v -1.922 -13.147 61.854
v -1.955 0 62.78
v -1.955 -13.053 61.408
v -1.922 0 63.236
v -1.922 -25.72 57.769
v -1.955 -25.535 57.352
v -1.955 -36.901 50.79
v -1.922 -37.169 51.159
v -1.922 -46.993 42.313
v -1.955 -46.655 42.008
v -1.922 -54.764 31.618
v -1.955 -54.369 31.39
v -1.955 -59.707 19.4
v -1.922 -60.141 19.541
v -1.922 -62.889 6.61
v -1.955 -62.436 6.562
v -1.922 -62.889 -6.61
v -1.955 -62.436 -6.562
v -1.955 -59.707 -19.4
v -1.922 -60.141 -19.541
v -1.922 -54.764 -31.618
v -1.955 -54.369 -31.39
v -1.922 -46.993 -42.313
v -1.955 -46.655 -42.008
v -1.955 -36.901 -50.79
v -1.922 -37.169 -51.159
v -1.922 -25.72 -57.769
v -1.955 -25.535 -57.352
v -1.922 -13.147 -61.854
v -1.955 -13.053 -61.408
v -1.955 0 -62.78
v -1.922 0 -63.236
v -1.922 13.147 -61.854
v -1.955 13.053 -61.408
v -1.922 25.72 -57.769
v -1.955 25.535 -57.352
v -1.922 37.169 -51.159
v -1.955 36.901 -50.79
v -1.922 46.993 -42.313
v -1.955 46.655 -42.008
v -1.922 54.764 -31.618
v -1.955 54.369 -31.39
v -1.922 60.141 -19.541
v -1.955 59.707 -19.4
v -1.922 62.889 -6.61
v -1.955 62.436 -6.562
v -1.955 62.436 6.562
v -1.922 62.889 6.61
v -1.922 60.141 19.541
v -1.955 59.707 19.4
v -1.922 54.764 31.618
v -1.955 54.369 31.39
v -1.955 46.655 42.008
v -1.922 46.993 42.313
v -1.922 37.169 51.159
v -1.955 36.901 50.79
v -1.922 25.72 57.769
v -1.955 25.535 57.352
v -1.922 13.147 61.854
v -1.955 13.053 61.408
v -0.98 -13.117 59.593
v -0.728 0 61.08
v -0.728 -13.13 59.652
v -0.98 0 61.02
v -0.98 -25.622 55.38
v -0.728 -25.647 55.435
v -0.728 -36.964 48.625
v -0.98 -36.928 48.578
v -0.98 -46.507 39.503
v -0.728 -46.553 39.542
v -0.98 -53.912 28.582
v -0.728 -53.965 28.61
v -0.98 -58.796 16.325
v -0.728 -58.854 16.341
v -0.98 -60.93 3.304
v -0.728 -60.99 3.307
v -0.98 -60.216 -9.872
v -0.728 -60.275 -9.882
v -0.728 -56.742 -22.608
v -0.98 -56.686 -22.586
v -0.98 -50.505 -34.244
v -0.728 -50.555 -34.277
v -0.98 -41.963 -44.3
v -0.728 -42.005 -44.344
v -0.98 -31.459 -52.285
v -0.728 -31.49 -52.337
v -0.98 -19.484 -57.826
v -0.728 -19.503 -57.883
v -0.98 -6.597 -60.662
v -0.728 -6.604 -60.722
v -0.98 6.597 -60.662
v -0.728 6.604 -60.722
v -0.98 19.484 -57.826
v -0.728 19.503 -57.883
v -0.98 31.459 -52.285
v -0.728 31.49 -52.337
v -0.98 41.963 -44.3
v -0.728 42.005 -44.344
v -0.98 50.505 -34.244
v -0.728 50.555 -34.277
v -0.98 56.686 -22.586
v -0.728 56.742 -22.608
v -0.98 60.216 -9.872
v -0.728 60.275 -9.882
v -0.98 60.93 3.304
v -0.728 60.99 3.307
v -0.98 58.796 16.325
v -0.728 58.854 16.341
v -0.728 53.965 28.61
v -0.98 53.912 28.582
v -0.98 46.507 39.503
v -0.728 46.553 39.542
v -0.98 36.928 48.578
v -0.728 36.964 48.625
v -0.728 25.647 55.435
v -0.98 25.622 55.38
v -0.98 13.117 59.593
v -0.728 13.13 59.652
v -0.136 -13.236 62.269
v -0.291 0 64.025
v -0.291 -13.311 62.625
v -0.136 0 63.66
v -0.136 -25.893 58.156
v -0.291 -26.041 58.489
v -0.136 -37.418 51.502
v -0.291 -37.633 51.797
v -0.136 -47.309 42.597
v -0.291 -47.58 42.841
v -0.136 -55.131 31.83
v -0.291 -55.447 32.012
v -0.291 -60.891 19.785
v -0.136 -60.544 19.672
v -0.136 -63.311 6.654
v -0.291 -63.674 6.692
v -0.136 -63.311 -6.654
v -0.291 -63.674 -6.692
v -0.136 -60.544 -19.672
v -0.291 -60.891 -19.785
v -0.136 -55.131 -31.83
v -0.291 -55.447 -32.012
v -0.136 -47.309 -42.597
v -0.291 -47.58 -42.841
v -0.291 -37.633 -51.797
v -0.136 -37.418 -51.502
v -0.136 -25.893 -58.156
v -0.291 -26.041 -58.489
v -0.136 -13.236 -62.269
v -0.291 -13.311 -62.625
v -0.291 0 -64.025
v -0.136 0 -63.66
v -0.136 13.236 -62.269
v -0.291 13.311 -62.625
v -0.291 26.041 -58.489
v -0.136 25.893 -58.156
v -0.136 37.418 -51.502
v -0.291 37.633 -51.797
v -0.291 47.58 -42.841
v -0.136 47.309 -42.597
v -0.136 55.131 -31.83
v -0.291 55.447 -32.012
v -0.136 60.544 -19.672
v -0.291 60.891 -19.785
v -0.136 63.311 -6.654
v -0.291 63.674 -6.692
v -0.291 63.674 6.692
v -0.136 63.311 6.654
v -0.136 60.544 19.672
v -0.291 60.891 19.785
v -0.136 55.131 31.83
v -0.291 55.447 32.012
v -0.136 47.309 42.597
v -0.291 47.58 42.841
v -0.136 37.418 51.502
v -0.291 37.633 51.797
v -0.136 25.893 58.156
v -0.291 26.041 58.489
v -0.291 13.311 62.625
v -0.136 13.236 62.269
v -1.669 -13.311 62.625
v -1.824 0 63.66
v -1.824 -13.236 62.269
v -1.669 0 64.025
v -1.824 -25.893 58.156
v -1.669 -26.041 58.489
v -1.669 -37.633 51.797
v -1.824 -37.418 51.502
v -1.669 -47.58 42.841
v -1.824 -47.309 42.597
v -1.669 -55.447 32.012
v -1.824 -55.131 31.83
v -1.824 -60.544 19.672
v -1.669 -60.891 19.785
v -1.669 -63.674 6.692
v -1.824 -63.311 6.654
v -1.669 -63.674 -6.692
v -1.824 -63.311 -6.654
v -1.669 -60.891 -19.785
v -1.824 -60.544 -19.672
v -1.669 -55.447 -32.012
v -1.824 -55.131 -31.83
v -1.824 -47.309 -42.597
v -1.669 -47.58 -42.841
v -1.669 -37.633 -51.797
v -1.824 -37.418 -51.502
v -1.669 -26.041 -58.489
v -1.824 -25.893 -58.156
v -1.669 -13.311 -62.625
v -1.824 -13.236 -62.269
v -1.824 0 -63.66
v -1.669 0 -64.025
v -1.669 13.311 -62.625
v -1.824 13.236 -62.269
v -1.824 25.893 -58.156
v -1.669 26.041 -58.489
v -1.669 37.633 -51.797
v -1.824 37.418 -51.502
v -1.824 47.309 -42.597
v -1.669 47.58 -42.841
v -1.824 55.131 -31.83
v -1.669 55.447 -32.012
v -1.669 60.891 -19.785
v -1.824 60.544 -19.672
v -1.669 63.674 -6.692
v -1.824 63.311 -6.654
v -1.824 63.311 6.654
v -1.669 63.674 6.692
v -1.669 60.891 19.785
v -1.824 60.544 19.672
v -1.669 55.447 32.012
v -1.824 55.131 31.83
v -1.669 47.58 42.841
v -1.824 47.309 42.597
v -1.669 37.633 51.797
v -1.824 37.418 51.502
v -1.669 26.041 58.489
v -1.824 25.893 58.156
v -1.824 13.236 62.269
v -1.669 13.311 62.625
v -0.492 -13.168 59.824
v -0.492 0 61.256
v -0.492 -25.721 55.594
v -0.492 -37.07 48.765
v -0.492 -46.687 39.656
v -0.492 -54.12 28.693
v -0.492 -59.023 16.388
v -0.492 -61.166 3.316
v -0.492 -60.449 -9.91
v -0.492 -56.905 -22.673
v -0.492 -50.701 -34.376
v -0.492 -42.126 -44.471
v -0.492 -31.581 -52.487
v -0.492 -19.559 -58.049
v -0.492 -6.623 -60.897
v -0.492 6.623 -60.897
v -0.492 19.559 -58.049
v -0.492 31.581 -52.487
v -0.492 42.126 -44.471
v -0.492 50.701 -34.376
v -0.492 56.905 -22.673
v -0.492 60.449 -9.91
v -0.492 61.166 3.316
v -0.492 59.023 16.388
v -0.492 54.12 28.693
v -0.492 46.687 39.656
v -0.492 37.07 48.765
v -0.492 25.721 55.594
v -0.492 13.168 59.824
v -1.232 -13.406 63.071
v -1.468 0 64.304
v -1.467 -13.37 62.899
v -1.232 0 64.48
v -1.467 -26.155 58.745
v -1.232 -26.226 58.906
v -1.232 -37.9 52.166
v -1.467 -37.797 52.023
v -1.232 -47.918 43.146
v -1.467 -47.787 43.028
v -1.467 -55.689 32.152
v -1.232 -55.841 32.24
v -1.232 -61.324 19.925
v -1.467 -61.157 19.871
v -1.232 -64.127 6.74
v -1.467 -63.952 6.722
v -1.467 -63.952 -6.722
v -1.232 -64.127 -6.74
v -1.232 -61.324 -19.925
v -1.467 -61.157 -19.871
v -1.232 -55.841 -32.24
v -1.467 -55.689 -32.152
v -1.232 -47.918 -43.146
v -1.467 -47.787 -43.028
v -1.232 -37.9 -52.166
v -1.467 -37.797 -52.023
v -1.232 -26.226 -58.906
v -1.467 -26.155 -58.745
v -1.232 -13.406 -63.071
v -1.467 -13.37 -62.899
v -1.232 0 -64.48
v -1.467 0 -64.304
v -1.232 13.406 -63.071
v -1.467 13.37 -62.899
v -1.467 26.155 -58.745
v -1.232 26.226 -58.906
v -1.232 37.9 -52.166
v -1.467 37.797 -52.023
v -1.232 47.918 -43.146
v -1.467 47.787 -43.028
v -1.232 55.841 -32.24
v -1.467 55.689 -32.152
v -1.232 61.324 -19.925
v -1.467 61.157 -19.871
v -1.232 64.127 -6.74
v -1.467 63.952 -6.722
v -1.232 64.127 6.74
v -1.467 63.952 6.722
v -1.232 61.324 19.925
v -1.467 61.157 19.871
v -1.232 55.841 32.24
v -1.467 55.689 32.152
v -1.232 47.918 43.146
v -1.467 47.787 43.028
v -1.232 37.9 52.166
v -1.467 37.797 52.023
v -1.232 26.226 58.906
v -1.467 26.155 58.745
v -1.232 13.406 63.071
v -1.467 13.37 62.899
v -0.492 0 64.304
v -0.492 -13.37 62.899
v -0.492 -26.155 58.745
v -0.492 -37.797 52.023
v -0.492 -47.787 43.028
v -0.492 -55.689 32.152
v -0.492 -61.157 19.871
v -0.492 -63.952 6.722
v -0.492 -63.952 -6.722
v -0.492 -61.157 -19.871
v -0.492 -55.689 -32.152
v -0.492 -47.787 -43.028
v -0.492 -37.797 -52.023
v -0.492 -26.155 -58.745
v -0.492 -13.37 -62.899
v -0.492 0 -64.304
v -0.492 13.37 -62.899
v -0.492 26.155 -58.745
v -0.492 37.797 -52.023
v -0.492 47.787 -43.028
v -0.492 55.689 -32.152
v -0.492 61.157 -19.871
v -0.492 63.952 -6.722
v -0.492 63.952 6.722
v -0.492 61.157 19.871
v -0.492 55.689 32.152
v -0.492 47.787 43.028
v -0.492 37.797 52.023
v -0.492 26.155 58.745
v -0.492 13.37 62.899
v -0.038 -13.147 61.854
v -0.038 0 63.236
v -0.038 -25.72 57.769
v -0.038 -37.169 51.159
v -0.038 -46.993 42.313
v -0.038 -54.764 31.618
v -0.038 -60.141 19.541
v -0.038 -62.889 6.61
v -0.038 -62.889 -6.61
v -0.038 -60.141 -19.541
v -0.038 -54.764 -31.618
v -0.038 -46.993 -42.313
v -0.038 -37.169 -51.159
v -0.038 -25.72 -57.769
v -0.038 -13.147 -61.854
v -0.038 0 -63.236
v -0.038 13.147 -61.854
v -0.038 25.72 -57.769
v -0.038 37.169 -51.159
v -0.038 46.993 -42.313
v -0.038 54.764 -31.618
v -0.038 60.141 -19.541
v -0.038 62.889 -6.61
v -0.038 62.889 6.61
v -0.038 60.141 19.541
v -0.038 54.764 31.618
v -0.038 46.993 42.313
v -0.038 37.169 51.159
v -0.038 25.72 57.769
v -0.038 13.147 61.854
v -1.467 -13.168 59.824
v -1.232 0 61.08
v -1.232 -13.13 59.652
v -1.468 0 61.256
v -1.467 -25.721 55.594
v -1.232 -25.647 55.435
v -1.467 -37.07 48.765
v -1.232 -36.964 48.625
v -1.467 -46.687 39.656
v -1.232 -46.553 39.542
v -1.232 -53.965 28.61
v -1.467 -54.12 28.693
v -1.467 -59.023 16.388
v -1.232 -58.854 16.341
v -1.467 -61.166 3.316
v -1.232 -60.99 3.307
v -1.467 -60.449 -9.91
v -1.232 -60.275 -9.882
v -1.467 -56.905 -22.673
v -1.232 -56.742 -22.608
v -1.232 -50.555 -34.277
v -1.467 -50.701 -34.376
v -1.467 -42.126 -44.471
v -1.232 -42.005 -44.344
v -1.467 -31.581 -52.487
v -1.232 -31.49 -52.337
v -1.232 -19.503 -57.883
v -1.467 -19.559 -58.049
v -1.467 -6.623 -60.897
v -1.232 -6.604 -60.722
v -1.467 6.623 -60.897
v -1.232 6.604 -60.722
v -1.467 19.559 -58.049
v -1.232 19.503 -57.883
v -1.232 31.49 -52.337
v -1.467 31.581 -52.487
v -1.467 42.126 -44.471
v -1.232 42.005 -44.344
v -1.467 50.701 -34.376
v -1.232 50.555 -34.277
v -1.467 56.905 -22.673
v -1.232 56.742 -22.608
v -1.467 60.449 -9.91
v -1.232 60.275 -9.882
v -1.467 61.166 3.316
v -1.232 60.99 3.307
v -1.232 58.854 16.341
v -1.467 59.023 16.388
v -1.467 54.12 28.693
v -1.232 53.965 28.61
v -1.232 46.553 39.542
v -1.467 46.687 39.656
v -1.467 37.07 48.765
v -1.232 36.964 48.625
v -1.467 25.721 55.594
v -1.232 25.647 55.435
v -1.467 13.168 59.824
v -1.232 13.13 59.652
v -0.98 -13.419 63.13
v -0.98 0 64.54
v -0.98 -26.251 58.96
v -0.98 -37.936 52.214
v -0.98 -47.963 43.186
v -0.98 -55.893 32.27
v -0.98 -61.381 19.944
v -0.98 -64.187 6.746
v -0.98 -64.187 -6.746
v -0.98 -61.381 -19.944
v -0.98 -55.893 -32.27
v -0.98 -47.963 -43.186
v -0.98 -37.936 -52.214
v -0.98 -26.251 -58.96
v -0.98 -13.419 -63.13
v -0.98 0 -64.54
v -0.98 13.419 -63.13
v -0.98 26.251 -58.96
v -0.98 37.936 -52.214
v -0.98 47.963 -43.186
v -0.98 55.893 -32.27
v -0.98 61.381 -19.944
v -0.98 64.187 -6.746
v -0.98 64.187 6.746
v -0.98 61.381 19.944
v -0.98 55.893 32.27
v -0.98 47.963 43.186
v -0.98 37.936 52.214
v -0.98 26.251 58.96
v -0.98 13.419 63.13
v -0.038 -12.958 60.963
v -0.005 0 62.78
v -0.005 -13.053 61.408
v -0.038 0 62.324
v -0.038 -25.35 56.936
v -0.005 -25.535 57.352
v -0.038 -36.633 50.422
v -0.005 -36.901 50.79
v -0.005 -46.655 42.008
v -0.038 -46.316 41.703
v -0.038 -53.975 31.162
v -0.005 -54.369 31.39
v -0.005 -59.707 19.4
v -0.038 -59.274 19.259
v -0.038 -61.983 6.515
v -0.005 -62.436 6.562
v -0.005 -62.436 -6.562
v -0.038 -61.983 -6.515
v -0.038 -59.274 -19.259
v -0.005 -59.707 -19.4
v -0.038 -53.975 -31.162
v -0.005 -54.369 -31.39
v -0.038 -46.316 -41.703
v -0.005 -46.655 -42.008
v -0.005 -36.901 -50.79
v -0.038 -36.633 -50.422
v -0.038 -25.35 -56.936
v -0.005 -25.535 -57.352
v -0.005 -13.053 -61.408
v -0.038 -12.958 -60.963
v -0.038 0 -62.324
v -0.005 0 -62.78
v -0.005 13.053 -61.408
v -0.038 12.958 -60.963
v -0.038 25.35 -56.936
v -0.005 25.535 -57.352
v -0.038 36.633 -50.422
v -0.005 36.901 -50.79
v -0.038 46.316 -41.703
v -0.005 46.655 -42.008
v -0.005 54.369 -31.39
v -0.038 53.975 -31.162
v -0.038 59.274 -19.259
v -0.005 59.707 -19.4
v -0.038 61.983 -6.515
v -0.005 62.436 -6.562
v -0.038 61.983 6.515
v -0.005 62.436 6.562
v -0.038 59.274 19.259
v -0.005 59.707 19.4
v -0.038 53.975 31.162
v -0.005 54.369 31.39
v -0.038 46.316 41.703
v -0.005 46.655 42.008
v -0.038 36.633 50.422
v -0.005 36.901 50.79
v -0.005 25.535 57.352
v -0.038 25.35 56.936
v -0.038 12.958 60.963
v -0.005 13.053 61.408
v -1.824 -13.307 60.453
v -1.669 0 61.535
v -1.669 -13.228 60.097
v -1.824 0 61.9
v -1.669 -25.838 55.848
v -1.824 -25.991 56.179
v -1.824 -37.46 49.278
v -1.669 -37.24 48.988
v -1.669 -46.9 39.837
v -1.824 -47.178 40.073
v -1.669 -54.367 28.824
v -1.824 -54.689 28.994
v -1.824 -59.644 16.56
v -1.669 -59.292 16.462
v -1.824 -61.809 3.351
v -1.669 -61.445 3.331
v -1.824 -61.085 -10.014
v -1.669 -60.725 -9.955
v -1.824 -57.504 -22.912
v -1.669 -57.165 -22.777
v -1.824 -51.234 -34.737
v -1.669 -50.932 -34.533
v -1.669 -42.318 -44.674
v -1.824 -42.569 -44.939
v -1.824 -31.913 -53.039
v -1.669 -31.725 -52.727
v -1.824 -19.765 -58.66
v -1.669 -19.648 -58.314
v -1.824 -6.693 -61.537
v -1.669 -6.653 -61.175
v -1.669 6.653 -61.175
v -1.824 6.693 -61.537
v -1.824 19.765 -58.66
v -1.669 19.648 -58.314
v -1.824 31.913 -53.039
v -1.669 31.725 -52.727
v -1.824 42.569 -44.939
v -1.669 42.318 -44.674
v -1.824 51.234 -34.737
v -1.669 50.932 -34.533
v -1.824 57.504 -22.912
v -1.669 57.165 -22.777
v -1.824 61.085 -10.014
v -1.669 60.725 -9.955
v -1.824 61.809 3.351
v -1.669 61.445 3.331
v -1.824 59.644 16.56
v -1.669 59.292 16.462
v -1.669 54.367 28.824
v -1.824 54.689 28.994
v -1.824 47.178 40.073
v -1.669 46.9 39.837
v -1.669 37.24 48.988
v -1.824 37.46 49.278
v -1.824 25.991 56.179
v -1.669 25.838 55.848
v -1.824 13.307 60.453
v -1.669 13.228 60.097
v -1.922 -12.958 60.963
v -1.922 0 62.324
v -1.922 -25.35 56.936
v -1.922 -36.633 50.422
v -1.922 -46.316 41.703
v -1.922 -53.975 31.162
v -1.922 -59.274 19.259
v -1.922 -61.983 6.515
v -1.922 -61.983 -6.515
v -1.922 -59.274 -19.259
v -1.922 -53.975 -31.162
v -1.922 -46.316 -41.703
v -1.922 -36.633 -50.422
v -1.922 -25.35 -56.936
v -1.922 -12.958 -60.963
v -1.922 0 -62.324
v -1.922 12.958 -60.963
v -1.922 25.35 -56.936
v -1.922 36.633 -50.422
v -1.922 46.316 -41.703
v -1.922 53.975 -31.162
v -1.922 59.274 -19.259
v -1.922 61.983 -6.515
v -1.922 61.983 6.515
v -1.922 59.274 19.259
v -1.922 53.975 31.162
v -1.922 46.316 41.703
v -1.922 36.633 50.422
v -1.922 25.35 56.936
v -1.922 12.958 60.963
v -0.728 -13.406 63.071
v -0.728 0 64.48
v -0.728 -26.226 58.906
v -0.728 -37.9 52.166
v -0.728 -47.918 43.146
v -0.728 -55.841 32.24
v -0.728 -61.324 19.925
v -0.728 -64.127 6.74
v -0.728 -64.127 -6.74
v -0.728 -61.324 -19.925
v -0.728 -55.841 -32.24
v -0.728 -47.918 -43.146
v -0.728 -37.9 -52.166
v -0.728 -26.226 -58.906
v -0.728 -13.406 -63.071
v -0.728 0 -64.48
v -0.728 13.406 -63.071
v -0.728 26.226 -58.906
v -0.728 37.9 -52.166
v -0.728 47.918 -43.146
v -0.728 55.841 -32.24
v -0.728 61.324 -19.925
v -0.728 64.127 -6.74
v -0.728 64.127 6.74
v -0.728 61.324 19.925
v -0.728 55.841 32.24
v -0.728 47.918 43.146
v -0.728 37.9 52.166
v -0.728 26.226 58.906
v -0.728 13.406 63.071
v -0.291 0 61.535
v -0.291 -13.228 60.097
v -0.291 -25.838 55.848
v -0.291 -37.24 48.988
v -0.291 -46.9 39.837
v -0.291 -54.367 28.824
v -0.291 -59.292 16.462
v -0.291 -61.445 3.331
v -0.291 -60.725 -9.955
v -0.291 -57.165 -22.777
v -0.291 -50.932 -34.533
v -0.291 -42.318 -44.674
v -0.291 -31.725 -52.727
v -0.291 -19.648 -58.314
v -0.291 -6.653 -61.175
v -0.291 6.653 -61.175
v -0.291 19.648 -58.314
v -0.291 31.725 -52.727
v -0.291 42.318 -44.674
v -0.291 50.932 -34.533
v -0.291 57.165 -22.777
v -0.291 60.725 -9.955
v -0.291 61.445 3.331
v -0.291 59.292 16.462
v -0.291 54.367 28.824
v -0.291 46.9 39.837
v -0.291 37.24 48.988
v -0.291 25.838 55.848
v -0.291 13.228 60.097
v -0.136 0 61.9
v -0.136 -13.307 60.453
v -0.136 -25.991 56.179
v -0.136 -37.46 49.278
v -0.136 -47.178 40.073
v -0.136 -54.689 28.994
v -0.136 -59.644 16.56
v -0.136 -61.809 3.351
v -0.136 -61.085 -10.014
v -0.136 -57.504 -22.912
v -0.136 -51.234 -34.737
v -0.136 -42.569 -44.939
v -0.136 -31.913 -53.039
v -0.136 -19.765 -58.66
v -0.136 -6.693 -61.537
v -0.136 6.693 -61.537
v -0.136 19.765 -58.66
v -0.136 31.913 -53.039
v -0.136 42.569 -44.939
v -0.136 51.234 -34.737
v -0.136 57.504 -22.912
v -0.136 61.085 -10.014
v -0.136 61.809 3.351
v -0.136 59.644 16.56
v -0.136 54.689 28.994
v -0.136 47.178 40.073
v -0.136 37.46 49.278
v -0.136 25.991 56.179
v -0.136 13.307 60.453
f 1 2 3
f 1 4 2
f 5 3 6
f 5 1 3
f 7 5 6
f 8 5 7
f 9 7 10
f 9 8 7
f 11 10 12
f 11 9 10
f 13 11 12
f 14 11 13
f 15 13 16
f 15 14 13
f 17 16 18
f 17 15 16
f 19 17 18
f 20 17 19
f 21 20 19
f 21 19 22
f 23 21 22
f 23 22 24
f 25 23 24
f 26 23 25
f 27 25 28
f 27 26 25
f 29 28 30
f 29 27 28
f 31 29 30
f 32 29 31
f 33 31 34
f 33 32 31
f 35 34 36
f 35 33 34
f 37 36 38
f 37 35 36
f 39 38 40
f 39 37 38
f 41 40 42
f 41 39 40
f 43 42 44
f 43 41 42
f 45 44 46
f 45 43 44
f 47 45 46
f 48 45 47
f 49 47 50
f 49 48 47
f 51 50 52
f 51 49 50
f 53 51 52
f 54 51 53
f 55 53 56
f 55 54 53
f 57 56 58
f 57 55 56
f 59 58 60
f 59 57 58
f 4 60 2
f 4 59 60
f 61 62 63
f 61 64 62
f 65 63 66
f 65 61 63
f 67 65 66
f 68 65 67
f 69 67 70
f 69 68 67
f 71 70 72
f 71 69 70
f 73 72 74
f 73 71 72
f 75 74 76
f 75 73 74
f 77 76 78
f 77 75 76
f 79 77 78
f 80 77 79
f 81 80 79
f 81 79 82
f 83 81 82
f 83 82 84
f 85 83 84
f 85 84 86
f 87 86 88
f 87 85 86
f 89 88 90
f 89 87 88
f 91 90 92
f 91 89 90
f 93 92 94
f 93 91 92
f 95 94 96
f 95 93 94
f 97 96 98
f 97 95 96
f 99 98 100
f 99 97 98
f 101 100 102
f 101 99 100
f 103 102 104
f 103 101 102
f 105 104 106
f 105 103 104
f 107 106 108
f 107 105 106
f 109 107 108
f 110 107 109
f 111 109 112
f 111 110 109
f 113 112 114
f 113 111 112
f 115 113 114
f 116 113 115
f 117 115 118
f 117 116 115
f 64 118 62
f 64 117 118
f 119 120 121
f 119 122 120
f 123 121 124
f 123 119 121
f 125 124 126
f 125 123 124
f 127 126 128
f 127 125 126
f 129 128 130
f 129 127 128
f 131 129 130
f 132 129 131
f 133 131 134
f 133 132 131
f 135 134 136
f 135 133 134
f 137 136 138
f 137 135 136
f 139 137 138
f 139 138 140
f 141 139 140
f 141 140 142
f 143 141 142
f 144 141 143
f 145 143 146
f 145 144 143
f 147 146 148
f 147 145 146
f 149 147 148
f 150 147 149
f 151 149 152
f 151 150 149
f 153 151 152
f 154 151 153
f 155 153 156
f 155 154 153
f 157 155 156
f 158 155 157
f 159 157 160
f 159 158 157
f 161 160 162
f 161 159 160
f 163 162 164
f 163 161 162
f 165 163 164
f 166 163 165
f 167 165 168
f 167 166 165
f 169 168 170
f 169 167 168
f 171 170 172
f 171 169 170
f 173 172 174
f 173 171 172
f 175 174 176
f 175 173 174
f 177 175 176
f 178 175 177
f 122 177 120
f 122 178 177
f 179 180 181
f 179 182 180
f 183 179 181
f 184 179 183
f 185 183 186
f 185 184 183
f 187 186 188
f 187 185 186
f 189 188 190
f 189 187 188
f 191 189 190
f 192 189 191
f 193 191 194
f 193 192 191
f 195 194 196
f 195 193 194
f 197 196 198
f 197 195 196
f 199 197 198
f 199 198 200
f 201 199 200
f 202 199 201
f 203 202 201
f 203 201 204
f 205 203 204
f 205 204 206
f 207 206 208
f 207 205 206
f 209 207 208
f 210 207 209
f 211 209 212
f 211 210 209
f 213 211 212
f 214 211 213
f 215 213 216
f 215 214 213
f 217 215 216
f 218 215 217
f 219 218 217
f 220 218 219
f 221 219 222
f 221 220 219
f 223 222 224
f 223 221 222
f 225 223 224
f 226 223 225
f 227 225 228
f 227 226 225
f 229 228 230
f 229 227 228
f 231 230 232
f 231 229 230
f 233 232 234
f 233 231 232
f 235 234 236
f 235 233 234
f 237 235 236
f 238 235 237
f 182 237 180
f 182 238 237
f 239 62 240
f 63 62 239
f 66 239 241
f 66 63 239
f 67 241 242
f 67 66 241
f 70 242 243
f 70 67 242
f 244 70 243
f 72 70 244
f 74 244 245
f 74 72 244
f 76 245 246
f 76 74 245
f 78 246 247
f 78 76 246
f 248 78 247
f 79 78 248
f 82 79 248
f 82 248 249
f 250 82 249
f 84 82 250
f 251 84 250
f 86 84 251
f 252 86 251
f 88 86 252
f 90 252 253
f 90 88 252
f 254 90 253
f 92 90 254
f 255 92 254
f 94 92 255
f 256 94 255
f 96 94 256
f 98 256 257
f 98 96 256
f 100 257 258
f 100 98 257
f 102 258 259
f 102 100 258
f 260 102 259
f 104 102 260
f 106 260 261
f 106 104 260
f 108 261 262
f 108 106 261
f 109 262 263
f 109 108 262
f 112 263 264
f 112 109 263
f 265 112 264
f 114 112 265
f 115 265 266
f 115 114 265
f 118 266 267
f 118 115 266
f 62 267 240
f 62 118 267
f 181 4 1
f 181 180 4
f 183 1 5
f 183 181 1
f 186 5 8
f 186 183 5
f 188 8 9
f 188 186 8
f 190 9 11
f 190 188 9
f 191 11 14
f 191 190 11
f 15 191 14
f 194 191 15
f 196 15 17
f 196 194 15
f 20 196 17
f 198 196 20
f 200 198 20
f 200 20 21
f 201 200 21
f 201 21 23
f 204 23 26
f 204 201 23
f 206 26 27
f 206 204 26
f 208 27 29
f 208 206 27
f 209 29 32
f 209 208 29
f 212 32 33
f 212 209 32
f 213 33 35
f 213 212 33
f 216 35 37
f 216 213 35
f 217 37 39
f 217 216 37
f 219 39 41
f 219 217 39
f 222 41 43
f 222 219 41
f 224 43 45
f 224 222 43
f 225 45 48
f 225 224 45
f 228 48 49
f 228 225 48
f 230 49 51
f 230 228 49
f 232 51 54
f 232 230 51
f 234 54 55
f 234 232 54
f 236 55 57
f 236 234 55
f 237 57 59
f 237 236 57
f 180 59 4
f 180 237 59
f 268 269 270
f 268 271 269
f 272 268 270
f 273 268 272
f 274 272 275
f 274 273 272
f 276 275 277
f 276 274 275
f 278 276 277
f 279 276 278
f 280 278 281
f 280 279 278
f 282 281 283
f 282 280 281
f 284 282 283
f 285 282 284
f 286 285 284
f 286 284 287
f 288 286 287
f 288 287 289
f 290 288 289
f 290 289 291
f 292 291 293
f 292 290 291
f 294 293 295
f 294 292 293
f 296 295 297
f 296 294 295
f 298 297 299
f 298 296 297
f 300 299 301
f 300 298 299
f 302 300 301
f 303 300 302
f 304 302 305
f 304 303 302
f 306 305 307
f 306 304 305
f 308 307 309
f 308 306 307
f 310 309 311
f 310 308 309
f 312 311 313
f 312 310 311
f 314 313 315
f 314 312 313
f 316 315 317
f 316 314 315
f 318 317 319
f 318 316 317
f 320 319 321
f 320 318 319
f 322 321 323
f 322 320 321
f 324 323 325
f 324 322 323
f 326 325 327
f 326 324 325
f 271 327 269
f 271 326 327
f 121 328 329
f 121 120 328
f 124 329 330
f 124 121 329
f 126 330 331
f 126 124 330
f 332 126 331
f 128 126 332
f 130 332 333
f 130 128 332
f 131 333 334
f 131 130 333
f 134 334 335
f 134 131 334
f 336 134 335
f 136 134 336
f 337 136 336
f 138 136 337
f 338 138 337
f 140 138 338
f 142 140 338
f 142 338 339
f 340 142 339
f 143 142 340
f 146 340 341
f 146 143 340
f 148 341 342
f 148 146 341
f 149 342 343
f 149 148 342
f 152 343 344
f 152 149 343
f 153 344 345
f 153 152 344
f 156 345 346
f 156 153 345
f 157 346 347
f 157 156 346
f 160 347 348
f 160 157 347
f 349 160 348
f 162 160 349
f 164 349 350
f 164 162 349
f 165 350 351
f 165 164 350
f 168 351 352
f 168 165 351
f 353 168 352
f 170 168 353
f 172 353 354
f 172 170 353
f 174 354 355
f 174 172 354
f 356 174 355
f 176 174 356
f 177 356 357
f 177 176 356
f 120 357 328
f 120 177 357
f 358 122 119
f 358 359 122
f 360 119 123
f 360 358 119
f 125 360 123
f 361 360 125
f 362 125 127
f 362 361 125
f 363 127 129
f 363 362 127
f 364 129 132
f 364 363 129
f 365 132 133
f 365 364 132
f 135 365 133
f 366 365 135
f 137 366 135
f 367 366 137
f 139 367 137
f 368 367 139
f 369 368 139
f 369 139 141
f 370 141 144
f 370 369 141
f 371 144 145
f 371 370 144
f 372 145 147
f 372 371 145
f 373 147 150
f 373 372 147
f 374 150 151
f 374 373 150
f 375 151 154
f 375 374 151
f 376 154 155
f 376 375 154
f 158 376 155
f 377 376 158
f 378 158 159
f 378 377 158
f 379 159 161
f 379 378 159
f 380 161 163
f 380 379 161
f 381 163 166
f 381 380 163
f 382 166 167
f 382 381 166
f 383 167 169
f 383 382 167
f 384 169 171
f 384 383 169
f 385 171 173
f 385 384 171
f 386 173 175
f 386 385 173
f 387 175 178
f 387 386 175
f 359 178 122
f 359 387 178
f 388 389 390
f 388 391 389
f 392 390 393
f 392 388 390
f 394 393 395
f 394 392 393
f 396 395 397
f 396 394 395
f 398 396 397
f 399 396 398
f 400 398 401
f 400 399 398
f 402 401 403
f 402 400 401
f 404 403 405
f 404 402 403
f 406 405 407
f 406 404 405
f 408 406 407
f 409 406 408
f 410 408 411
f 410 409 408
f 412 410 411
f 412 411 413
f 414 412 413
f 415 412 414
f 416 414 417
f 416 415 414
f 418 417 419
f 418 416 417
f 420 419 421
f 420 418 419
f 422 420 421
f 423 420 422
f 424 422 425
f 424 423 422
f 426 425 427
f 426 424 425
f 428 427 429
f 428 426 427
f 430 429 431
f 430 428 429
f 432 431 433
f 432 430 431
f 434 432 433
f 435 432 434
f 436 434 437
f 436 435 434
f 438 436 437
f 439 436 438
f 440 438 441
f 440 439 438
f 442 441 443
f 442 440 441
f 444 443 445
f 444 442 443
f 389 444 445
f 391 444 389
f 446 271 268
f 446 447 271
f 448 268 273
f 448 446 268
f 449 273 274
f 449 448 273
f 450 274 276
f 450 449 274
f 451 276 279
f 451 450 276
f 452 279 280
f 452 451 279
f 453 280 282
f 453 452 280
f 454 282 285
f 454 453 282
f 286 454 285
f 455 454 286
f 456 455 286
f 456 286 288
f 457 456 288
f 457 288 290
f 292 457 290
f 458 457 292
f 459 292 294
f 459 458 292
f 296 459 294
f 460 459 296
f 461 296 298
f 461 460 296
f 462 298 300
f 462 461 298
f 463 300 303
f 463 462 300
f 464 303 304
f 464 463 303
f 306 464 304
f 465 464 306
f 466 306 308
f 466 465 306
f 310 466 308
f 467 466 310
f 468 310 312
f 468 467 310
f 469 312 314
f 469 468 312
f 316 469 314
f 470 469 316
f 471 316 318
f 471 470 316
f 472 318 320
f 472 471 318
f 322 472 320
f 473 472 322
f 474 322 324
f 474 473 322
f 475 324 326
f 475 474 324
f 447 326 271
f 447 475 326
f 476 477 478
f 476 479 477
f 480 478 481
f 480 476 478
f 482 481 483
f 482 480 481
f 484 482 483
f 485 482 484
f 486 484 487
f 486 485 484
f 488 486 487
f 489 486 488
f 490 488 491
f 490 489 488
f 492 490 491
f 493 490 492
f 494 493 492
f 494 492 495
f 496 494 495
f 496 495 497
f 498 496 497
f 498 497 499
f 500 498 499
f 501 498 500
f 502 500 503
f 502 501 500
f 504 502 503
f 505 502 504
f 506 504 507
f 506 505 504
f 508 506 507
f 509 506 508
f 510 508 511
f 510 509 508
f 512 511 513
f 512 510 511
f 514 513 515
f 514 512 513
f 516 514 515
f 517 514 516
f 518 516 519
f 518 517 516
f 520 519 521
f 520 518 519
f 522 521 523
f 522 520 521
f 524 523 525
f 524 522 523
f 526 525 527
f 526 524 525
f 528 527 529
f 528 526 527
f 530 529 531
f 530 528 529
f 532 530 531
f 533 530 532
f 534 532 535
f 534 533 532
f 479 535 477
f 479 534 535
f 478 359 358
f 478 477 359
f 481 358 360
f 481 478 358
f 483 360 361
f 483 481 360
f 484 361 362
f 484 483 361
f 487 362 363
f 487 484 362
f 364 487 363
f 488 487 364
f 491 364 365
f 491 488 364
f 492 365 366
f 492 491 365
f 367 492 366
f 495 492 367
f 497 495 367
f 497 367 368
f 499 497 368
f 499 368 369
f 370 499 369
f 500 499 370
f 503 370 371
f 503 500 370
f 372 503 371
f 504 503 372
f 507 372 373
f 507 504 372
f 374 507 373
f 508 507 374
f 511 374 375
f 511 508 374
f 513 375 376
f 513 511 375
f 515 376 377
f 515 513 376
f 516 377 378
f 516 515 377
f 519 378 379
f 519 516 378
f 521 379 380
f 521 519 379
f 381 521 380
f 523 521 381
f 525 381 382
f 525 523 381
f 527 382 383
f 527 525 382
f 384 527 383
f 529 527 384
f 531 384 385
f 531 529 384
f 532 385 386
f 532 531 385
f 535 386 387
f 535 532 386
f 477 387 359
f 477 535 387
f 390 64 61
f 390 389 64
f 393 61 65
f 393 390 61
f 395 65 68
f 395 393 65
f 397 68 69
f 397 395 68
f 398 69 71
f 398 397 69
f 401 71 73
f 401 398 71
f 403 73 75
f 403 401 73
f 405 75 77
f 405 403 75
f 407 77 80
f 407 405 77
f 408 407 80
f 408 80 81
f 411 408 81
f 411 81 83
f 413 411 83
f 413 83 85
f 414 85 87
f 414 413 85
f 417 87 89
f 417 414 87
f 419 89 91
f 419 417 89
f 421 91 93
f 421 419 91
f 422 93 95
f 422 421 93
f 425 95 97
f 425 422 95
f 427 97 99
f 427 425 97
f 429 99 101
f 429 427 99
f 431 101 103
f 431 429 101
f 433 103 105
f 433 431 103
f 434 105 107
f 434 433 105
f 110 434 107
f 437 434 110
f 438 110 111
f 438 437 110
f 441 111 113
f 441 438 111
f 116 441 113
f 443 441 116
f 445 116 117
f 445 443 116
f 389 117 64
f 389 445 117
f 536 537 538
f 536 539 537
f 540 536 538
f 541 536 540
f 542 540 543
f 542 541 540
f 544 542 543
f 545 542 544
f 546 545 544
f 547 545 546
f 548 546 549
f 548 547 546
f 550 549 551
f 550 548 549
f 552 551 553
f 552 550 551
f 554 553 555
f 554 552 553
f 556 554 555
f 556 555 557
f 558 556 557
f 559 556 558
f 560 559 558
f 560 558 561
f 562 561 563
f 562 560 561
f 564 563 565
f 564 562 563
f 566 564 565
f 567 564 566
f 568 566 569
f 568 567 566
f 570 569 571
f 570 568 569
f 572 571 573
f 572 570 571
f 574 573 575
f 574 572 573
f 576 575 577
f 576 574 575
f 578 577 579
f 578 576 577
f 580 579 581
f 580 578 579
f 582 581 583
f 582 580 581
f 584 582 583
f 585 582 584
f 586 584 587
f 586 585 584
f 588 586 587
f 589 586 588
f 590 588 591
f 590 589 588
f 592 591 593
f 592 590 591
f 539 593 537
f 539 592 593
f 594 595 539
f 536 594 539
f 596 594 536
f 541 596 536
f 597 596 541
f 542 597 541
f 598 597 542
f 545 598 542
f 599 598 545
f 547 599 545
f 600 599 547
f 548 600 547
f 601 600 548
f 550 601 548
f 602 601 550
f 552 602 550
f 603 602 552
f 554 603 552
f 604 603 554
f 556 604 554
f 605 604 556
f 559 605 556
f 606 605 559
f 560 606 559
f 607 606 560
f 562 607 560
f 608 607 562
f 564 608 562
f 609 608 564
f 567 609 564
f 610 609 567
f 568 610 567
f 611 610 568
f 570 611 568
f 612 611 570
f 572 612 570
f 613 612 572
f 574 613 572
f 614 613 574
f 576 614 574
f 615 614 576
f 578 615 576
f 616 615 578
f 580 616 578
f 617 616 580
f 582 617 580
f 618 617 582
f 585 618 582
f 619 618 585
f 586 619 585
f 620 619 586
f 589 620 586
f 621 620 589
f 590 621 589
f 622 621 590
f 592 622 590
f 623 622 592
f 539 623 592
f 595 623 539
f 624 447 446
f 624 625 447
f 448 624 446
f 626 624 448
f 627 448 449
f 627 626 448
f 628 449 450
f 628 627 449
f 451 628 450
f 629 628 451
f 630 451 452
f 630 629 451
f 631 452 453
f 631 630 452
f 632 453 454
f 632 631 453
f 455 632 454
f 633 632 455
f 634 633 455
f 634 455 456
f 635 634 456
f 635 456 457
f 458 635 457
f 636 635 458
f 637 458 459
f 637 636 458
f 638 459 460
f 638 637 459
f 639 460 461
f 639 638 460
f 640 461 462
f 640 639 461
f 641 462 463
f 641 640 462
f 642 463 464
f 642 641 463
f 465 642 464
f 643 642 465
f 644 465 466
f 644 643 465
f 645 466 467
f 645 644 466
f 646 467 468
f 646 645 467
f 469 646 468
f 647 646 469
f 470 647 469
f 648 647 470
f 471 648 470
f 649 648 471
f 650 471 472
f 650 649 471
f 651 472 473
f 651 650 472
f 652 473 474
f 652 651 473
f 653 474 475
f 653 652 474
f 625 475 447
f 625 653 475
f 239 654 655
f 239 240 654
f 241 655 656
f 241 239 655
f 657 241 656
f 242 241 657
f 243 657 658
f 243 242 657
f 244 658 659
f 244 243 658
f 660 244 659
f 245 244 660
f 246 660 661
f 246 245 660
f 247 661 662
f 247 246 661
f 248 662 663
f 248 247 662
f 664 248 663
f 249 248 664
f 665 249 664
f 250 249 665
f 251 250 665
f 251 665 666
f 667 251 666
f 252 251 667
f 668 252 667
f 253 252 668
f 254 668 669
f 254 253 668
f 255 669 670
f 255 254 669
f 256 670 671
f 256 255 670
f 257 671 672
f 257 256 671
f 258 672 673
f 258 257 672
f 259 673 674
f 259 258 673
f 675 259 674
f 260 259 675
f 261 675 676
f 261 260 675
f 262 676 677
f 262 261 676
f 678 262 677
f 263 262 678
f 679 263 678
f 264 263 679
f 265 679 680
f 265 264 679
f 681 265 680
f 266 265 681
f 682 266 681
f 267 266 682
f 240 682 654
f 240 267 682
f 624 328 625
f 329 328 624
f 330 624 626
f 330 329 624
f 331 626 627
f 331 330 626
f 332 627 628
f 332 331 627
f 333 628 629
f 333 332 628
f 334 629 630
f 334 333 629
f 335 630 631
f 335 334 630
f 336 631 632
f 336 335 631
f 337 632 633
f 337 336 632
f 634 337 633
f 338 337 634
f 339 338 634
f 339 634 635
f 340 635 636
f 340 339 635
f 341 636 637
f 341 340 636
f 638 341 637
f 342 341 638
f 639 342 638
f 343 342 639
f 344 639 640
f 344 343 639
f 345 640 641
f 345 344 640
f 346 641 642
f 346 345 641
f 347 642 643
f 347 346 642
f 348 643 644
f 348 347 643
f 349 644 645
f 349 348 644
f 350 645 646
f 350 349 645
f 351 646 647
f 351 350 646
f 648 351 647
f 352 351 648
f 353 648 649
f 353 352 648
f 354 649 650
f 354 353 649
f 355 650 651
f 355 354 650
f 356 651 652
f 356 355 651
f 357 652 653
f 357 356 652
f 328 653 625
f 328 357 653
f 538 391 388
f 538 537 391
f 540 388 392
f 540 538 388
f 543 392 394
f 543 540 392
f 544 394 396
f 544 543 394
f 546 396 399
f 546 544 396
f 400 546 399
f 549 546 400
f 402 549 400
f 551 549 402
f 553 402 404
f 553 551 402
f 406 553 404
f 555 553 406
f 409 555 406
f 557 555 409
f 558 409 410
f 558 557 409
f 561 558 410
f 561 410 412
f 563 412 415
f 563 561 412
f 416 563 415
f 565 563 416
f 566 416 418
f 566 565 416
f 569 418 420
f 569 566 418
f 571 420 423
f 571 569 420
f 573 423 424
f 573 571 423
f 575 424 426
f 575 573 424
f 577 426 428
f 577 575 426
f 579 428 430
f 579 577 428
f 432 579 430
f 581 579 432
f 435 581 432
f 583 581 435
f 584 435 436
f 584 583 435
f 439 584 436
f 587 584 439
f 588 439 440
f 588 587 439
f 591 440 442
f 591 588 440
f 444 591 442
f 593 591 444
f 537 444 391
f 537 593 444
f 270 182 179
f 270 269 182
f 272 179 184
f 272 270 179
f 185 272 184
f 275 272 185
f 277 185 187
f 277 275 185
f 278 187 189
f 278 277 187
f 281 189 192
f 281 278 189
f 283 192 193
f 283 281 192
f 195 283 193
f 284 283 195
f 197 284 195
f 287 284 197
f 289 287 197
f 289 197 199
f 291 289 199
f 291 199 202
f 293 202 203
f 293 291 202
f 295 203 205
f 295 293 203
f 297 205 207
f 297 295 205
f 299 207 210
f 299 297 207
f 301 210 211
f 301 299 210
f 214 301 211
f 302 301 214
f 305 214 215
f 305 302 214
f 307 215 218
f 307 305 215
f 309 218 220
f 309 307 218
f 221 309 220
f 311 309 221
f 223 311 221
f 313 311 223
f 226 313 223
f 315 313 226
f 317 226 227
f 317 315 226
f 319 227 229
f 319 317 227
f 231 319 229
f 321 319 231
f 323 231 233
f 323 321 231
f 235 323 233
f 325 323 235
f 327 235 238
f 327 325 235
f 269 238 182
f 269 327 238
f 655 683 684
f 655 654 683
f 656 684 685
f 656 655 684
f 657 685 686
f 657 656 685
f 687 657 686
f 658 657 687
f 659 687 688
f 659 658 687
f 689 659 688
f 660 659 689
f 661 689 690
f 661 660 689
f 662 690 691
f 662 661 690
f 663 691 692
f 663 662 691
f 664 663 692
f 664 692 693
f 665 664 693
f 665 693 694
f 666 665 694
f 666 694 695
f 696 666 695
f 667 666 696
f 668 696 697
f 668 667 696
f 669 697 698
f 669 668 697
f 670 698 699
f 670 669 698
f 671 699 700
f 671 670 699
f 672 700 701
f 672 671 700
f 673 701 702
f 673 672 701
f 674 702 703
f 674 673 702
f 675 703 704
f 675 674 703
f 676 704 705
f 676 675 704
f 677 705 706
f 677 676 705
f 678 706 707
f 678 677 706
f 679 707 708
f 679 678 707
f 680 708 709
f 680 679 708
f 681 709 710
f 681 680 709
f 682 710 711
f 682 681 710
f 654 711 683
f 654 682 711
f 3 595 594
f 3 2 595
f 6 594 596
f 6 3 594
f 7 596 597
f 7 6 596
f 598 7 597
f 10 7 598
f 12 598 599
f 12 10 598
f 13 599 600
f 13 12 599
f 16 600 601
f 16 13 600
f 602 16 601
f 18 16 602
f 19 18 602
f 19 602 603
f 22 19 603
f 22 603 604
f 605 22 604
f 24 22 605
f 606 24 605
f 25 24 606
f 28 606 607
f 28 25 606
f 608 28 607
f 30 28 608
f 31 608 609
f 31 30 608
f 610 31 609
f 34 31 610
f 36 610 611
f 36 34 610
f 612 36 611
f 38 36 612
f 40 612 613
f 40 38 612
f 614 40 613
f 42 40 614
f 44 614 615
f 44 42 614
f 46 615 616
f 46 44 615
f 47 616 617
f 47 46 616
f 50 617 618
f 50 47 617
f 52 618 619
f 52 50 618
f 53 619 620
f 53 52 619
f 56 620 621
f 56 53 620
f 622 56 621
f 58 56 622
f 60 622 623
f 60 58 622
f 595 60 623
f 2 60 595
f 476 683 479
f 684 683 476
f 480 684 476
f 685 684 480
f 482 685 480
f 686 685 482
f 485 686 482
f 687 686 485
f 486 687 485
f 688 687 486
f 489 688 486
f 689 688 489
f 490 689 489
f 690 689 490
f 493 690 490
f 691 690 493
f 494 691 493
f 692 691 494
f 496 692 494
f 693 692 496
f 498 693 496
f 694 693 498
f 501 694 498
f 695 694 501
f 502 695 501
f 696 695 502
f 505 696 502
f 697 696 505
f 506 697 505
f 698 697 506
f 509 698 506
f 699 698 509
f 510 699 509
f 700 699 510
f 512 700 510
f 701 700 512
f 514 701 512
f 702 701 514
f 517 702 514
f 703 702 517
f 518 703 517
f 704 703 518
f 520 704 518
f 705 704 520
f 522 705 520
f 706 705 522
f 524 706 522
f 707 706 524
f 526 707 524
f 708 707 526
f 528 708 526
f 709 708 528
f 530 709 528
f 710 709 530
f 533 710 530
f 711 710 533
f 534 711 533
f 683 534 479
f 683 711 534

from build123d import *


with BuildPart() as part:
    # O_Ring_Inner Sketch → O_Ring_Inner (revolve)
    with BuildSketch(Plane.XY):
        Polygon((-1.955, 62.78), (-1.921777681, 63.235548065), (-1.824374769, 63.660051282), (-1.669429112, 64.024580459), (-1.4675, 64.304293534), (-1.232348569, 64.480128524), (-0.98, 64.540102564), (-0.727651431, 64.480128524), (-0.4925, 64.304293534), (-0.290570888, 64.024580459), (-0.135625231, 63.660051282), (-0.038222319, 63.235548065), (-0.005, 62.78), (-0.038222319, 62.324451935), (-0.135625231, 61.899948718), (-0.290570888, 61.535419541), (-0.4925, 61.255706466), (-0.727651431, 61.079871476), (-0.98, 61.019897436), (-1.232348569, 61.079871476), (-1.4675, 61.255706466), (-1.669429112, 61.535419541), (-1.824374769, 61.899948718), (-1.921777681, 62.324451935), align=None)
    revolve(axis=Axis((-1000, 0, 0), (1, 0, 0)))


solid = part.part
